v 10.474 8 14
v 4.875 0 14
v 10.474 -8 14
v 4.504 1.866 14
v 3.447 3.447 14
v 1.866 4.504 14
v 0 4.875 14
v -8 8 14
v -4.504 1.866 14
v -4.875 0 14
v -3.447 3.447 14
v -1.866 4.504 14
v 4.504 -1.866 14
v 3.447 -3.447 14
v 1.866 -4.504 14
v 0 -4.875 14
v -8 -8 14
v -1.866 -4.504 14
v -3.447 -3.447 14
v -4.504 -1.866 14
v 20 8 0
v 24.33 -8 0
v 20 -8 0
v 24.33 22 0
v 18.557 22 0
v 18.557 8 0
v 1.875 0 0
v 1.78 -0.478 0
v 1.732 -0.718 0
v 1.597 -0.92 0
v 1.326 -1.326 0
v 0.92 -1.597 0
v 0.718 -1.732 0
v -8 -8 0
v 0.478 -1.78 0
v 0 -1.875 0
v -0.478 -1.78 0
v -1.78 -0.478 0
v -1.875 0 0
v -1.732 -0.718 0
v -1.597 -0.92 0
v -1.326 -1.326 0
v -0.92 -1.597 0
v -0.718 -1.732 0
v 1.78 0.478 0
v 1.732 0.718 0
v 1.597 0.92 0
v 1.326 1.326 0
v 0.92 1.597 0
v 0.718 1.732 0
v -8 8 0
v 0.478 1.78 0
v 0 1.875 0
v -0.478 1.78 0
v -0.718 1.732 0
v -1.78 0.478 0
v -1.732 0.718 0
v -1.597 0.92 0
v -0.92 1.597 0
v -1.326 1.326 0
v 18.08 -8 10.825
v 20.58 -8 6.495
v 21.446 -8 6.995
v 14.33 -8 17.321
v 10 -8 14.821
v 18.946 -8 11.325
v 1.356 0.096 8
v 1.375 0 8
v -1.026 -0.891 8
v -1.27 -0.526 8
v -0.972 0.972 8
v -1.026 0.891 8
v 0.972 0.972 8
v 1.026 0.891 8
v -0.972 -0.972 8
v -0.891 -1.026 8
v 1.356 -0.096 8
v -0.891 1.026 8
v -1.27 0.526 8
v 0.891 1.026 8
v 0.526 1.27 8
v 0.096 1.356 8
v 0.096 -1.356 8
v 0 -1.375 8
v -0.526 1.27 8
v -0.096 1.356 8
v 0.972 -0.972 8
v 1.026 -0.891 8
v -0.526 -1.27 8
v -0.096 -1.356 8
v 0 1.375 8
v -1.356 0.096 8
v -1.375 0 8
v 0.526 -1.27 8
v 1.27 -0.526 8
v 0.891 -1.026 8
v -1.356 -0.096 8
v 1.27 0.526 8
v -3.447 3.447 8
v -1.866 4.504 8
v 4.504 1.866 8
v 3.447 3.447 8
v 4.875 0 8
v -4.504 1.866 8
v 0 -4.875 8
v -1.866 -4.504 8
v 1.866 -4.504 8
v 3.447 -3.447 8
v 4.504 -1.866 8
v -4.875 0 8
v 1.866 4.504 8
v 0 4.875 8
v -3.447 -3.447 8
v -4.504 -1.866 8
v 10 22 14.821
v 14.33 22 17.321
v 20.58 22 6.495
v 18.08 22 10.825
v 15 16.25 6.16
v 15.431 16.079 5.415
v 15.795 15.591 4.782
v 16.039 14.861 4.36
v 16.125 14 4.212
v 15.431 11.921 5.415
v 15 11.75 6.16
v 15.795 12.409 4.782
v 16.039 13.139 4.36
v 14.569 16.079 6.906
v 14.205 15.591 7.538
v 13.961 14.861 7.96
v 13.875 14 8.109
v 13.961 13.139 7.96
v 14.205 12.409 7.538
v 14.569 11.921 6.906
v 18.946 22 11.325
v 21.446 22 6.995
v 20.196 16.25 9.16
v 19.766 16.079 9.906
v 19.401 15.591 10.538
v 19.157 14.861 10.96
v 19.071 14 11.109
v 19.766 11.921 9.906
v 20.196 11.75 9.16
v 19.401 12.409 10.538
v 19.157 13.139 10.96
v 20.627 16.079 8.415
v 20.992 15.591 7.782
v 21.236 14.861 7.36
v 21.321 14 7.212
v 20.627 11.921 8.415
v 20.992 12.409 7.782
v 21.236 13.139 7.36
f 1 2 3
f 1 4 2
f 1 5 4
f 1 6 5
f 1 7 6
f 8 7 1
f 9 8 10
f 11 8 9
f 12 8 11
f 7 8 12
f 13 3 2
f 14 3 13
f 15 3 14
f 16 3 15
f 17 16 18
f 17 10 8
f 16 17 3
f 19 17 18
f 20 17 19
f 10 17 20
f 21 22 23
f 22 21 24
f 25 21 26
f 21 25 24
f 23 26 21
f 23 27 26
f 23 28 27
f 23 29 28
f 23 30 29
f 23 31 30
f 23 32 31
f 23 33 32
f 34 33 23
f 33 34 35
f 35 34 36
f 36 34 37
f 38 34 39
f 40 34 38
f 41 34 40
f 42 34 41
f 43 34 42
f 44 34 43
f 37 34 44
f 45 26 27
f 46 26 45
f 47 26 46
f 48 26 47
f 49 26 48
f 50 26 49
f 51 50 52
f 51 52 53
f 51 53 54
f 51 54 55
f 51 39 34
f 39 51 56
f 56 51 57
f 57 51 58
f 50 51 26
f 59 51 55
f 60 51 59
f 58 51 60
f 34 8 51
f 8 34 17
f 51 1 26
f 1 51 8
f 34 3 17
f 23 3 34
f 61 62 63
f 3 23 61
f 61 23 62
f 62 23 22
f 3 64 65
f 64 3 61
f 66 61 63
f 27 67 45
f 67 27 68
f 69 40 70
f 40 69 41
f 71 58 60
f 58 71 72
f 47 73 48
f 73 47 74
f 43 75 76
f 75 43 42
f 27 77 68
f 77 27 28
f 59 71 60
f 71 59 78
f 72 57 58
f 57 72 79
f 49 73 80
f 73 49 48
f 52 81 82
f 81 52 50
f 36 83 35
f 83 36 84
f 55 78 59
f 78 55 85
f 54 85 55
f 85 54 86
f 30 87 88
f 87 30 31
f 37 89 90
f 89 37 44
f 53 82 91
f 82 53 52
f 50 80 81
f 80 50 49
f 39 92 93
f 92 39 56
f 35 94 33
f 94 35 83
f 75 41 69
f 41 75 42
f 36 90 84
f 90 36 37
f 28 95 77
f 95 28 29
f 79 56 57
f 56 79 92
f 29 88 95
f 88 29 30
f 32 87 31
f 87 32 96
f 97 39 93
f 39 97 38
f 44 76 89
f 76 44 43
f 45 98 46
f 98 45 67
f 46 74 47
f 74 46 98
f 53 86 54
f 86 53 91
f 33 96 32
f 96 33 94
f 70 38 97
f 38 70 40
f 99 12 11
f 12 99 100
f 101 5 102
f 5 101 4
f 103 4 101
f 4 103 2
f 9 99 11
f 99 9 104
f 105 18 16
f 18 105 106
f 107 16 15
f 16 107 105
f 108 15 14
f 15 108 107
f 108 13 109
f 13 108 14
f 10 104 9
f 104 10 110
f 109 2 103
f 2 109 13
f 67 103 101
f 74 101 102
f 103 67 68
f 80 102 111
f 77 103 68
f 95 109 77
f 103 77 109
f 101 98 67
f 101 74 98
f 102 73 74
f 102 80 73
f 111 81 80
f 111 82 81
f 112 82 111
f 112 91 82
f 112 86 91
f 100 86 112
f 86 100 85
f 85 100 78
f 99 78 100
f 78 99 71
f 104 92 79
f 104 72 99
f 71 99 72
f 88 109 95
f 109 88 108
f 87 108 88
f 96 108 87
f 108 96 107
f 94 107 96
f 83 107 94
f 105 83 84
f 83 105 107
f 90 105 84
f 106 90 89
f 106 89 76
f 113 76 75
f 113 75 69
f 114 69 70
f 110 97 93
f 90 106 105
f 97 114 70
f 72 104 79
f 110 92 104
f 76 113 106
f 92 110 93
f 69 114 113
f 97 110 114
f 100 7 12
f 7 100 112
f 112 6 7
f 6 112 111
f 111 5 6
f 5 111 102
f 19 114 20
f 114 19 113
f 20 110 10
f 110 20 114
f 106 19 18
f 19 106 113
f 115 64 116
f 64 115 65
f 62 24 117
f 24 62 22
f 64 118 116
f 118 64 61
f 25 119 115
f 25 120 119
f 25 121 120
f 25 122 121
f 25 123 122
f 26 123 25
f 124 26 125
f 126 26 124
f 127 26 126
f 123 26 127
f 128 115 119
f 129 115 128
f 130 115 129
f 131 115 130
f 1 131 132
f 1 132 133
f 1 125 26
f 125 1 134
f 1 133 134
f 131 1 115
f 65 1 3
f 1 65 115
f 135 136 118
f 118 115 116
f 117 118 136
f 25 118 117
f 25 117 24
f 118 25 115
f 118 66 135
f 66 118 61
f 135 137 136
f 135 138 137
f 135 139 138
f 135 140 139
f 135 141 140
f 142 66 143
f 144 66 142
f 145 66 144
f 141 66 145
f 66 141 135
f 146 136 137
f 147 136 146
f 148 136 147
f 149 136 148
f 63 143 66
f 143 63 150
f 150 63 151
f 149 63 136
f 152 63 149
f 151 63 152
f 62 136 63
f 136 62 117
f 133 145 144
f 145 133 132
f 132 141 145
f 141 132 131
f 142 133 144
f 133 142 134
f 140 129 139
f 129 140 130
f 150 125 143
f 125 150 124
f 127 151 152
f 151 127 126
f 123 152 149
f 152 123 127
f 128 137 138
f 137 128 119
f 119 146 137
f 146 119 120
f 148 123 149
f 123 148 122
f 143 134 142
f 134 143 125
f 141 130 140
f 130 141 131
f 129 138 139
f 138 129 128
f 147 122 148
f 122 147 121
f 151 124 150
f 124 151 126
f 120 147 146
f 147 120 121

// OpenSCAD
$fn=16;
Angle=60;

module Mount() {
	difference() {
		union() {
			translate([0,0,0])cube([20,30,5]);
			translate([7.5,0,0])cube([5,30,6]);
		}
		translate([10,8,-0.1])cylinder(h=10,d=4.5);
	}
}


difference() {
	translate([-8,-8,0])cube([28,16,14]);
	cylinder(h=20, d1=5,d2=2.5,center=true);
	translate([0,0,8])cylinder(h=20, d=9.75);

	translate([22,10,0])rotate([0,-Angle,180])cube([20,20,20]);
}

difference() {
	translate([20,22,-2.5])rotate([0,-Angle,180])Mount();
	translate([0,0,-5])cube([100,100,10],center=true);
}
